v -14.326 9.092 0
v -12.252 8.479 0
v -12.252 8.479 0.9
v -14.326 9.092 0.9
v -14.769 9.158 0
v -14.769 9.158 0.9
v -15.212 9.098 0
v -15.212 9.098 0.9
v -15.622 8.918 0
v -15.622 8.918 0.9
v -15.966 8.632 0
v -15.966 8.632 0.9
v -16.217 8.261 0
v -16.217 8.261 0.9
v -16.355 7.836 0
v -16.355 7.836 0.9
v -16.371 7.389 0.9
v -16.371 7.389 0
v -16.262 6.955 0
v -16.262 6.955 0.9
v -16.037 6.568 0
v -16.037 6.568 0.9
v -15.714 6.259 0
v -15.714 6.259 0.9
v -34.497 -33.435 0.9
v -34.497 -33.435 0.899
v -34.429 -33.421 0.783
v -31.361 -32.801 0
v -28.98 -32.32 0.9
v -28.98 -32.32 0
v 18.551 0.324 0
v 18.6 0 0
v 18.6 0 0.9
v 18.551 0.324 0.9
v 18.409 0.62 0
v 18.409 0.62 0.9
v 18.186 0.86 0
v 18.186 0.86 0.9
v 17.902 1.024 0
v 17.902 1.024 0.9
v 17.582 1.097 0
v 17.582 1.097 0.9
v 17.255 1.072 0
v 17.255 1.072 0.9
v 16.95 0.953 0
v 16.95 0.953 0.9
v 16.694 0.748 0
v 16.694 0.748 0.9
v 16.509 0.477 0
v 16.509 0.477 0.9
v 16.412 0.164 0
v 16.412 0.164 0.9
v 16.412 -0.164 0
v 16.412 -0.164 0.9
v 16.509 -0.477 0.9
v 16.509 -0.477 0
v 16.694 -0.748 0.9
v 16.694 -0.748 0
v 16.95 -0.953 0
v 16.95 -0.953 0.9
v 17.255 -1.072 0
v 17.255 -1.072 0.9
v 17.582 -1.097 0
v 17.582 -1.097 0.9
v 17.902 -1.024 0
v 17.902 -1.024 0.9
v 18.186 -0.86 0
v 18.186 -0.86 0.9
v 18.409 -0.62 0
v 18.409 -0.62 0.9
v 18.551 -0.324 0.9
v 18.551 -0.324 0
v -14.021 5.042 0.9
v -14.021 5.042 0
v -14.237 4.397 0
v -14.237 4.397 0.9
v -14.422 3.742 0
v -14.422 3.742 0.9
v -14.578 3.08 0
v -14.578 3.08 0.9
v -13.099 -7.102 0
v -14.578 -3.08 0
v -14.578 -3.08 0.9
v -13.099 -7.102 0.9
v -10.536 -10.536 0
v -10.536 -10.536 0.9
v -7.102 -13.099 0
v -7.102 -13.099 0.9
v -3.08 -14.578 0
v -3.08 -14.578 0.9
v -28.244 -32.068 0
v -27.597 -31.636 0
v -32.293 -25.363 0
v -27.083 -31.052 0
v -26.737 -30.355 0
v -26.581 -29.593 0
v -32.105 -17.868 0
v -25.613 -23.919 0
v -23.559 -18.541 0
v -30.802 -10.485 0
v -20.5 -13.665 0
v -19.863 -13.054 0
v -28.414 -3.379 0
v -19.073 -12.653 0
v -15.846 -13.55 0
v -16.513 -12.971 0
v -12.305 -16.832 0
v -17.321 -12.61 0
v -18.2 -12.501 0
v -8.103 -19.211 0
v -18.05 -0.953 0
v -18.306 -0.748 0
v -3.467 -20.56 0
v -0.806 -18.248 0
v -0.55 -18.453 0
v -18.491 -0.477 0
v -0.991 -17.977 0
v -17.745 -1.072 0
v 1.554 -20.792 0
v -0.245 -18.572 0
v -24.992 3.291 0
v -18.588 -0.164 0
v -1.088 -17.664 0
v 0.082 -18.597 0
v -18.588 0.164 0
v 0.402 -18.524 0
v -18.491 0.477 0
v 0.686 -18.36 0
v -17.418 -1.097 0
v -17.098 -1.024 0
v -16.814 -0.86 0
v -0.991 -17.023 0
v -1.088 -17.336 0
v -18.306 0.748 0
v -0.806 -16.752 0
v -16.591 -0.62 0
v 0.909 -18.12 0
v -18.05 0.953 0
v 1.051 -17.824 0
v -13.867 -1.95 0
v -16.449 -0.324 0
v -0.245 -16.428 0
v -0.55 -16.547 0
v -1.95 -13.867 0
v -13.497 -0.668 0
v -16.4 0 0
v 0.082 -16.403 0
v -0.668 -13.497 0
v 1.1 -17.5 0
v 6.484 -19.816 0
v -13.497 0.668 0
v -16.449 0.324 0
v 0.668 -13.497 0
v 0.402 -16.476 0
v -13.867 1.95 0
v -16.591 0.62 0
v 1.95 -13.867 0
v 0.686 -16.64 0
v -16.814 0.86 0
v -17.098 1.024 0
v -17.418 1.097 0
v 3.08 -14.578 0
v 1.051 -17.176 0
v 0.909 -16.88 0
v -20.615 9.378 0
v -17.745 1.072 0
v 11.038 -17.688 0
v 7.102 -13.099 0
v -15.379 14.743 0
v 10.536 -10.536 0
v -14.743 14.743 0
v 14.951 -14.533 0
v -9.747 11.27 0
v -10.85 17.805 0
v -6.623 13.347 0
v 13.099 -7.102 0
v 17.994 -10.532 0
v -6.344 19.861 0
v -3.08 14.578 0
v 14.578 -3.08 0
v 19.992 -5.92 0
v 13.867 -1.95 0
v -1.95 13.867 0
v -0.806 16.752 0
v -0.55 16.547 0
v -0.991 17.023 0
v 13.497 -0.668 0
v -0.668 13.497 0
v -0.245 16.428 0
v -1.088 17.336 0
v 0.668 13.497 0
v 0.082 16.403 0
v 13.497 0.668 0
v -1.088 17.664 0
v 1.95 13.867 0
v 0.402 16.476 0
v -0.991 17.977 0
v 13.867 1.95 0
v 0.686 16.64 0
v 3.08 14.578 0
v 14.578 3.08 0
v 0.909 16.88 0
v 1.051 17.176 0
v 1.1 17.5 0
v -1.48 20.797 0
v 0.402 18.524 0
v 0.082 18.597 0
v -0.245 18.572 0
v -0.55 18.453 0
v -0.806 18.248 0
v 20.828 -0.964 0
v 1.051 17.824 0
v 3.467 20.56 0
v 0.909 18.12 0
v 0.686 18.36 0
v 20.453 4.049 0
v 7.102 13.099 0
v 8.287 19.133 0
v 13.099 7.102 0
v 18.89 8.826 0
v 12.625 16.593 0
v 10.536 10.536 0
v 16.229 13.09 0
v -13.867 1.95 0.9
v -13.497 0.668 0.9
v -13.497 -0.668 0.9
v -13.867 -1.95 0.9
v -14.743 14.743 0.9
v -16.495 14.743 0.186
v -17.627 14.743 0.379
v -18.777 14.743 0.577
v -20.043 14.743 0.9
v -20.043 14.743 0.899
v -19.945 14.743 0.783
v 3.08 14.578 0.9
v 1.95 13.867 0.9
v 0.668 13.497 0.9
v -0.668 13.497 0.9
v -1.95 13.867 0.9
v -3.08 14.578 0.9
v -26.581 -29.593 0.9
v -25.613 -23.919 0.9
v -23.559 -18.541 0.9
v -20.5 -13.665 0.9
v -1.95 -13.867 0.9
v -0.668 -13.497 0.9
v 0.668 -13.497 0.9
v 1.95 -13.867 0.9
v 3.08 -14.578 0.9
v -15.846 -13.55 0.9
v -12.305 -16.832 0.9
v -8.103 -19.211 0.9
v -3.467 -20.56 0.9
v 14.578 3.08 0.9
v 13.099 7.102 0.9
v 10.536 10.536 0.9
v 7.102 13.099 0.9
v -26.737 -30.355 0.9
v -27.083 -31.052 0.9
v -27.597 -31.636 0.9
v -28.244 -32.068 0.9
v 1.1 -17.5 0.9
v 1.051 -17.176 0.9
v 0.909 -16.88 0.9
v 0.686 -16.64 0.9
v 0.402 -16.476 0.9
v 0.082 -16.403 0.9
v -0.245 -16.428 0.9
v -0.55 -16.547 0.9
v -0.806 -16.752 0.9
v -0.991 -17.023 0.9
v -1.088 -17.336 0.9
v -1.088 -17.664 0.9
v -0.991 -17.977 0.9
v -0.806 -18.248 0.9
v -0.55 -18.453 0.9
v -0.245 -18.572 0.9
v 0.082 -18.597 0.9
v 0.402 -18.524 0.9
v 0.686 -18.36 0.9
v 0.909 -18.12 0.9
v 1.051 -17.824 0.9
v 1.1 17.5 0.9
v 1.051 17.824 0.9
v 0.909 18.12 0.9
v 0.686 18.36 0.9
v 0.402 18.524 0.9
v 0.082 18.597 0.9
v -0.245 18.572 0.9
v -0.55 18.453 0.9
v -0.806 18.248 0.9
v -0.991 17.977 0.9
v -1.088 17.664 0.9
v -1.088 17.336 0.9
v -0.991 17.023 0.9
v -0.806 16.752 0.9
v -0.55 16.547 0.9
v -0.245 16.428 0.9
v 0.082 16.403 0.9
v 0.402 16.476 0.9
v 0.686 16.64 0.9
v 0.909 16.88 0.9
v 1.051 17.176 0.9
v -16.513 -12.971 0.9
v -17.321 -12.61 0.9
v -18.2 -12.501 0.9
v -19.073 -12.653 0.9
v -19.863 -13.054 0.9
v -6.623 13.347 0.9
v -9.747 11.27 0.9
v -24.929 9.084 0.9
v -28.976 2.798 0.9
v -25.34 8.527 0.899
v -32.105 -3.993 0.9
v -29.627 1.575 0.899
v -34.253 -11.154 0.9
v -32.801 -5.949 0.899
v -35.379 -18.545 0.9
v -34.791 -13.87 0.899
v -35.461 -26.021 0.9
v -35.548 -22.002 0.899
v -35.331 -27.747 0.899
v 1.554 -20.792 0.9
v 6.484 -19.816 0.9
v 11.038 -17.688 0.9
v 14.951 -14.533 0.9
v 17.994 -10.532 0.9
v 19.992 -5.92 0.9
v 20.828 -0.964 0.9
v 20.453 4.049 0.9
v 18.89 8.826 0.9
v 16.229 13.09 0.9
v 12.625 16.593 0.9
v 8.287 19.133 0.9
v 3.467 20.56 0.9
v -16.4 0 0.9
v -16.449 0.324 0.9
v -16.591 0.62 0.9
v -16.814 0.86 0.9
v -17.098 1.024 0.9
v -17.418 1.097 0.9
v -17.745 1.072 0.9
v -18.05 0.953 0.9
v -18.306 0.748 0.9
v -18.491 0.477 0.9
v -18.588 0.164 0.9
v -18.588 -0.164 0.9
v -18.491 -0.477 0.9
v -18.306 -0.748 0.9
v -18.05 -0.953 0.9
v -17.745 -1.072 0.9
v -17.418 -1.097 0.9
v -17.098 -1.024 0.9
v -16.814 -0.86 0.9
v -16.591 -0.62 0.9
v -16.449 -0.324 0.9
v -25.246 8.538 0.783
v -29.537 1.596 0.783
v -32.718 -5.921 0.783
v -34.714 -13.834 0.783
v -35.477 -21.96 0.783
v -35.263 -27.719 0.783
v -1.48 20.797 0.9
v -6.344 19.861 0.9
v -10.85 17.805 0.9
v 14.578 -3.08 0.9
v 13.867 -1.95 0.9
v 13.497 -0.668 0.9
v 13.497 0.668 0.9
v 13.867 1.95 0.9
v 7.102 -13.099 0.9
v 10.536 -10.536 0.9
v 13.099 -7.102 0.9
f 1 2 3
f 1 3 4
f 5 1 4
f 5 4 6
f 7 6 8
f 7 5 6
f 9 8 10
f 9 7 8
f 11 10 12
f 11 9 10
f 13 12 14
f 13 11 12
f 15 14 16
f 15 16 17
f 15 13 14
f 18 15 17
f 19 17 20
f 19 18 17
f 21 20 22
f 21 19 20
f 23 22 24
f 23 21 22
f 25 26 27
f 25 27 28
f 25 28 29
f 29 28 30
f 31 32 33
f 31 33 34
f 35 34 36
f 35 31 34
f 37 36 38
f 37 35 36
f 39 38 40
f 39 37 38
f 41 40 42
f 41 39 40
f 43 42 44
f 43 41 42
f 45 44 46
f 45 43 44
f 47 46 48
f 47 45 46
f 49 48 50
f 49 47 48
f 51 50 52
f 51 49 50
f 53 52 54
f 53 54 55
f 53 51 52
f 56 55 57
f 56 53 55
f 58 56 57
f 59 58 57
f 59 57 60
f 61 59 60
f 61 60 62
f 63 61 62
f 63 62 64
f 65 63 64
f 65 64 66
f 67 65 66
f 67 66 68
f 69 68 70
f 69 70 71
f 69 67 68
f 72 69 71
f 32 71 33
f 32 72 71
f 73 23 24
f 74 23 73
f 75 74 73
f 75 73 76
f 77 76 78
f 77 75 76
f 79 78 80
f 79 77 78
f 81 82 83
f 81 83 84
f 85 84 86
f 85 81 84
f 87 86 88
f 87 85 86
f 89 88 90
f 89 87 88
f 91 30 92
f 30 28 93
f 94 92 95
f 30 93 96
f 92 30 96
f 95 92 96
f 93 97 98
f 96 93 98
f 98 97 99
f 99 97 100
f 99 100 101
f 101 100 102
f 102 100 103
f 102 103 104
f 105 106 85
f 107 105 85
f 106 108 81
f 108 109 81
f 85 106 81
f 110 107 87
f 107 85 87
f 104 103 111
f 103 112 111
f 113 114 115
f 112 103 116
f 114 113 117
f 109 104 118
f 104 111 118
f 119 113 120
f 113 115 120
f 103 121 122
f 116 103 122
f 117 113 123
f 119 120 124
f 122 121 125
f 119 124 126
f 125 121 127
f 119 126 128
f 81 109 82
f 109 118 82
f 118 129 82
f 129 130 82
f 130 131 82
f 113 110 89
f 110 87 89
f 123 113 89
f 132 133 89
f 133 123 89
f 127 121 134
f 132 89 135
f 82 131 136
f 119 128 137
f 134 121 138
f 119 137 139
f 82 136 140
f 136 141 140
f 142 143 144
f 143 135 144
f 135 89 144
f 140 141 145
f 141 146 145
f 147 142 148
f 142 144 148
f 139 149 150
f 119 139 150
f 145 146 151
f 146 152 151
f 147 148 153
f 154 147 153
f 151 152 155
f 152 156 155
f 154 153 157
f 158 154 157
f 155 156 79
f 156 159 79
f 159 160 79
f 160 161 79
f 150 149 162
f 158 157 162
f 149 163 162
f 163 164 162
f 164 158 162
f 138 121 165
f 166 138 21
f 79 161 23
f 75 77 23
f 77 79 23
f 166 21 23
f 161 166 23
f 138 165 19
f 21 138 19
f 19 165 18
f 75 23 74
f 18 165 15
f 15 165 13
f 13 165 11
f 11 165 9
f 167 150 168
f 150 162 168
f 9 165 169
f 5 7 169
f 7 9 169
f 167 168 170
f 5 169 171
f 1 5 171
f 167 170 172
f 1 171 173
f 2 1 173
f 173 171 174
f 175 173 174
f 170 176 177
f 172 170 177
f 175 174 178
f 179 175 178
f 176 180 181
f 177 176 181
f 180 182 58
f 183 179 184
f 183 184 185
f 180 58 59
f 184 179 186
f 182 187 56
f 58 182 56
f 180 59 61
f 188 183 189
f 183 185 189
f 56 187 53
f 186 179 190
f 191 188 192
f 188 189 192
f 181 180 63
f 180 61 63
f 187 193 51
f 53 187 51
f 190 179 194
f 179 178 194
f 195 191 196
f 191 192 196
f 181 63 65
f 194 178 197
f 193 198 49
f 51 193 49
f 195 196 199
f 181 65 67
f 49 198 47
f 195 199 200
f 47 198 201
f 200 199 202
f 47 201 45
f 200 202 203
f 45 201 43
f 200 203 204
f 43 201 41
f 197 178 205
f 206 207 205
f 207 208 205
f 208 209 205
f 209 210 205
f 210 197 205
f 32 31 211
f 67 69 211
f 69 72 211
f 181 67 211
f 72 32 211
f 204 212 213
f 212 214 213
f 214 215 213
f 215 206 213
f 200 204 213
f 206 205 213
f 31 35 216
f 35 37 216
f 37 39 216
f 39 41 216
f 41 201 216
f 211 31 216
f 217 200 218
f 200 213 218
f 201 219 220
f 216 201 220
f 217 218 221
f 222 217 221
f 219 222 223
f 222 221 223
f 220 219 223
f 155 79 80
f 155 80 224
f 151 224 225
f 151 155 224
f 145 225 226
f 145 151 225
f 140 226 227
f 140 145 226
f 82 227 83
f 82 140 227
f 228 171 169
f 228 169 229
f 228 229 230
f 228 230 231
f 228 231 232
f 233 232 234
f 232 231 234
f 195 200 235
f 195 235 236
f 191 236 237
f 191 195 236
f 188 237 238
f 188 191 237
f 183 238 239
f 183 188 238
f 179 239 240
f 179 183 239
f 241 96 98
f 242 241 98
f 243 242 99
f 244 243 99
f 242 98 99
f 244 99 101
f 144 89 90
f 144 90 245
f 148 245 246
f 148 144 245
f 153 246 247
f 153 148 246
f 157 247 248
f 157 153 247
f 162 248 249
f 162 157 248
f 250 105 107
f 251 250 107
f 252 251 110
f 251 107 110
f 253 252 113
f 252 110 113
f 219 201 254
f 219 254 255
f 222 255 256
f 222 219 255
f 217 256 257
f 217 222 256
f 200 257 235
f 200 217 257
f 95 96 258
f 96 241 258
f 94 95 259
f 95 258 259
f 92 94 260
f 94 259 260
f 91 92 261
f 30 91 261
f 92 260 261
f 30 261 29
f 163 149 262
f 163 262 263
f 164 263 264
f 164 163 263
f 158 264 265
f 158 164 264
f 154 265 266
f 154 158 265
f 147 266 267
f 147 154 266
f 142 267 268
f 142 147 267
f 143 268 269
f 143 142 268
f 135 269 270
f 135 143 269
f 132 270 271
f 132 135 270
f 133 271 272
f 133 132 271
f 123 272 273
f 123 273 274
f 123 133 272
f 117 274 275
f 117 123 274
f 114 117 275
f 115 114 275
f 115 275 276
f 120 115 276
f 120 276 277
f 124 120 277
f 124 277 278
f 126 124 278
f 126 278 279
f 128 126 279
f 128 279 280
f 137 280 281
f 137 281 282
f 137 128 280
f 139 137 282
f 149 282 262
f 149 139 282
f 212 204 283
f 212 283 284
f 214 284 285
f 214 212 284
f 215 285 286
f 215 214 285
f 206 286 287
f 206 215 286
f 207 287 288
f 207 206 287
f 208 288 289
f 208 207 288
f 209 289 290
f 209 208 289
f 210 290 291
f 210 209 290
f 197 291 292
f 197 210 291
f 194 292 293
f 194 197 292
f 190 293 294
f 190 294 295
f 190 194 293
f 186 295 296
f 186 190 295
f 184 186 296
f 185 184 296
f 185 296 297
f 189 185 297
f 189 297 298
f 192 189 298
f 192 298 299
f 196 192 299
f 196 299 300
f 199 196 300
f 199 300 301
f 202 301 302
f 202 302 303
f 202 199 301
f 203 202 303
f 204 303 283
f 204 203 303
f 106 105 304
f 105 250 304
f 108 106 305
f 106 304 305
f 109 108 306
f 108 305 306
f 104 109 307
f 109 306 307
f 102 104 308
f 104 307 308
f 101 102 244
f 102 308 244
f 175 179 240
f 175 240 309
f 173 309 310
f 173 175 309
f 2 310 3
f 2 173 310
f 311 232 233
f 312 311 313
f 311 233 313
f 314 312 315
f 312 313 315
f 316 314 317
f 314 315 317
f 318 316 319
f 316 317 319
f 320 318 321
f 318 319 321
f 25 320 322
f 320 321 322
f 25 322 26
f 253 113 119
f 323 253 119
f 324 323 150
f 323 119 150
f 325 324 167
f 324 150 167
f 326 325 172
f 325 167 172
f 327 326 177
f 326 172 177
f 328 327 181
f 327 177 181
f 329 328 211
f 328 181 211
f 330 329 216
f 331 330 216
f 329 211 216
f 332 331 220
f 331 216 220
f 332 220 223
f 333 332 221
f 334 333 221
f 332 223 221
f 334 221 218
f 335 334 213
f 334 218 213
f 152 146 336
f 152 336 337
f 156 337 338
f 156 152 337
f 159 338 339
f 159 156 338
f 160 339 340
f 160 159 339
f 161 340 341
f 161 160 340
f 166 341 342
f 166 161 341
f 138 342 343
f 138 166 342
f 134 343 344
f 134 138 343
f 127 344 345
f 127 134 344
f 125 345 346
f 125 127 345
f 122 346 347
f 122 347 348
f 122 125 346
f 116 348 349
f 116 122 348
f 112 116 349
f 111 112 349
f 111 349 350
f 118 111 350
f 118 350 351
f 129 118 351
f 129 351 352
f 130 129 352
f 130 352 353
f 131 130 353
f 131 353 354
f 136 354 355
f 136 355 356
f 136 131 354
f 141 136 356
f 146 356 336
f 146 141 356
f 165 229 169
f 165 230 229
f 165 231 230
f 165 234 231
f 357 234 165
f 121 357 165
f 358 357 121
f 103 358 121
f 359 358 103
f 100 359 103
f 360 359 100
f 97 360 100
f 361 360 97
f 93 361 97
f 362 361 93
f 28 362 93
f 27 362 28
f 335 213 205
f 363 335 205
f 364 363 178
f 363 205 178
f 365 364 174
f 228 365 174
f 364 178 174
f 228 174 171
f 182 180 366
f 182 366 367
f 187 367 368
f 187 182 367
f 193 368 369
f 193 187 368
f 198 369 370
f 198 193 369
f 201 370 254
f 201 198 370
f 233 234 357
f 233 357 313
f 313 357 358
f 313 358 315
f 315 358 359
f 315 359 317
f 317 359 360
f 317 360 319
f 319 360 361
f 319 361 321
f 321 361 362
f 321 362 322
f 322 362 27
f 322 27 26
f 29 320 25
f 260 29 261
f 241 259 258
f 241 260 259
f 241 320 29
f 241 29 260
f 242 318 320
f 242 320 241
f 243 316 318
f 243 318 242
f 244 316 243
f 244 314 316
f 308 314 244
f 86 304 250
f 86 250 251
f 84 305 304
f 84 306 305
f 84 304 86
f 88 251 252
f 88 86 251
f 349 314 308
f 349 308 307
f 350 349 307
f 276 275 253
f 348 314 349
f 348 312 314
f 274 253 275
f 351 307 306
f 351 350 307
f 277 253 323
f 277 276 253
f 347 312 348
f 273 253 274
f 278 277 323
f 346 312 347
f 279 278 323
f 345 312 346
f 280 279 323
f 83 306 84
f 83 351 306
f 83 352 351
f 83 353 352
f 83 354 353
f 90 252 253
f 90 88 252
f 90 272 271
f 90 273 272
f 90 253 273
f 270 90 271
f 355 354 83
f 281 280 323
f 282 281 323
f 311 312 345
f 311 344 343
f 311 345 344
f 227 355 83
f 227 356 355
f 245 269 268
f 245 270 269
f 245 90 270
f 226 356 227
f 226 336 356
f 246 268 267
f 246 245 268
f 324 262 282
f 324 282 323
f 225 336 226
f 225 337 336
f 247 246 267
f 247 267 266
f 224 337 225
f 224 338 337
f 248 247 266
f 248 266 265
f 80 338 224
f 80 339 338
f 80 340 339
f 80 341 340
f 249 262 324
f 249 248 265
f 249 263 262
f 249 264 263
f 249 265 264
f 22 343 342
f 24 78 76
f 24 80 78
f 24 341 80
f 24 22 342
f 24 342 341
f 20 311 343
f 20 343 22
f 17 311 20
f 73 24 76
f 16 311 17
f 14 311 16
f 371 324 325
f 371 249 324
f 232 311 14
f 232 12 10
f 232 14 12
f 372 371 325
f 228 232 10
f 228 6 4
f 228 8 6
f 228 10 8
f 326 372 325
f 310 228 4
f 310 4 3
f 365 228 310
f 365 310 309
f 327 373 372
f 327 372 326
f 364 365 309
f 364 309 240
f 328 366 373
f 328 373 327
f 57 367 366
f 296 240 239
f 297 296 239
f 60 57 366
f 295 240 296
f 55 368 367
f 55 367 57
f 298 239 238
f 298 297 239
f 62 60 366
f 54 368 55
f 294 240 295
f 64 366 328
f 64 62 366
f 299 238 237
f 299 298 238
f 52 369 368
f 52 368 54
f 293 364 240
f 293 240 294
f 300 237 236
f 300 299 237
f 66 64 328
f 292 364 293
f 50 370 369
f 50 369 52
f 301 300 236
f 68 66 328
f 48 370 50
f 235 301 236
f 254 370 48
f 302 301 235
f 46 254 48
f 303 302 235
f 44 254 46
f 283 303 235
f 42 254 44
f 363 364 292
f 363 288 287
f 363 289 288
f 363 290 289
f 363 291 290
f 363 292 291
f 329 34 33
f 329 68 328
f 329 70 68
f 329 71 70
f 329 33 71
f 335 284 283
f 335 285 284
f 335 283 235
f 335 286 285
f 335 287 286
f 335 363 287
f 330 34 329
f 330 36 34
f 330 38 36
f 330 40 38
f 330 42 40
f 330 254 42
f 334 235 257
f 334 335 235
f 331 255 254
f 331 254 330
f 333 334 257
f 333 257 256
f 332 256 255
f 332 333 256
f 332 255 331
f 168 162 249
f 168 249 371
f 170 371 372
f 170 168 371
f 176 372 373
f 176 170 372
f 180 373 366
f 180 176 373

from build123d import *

# Parameters (mm, degrees)
TOP_BLADE_PROFILE_R     = 1.1
BASIC_BLADE_SHAPE_DEPTH = 0.9
EDGE_GRIND_SIZE         = 0.072
EDGE_GRIND_SIZE2        = 0.098954535
BLADE_ROOT_FILLET_R     = 3
BLADE_END_FILLET_R      = 3


with BuildPart() as part:
    # top blade profile → basic blade shape (new body)
    with BuildSketch(Plane.XY):
        with BuildLine():
            Line((-14.743176388, 14.743176388), (-20.043176388, 14.743176388))
            ThreePointArc((-20.043176388, 14.743176388), (-33.304536559, -7.535711071), (-34.497327018, -33.435320159))
            Line((-34.497327018, -33.435320159), (-26.655881065, -31.850477781))
            ThreePointArc((-26.655881065, -31.850477781), (-24.405908014, -20.396982829), (-17.885844028, -10.715366695))
            ThreePointArc((-17.885844028, -10.715366695), (-11.75653181, -17.219362932), (-3.467222551, -20.559690362))
            ThreePointArc((-3.467222551, -20.559690362), (20.559690362, -3.467222551), (3.467222551, 20.559690362))
            ThreePointArc((3.467222551, 20.559690362), (-6.343874402, 19.861464135), (-14.743176388, 14.743176388))
        make_face()
        with Locations((-17.5, 0)):
            Circle(TOP_BLADE_PROFILE_R, mode=Mode.SUBTRACT)
        with Locations((0, -17.5)):
            Circle(TOP_BLADE_PROFILE_R, mode=Mode.SUBTRACT)
        with Locations((17.5, 0)):
            Circle(TOP_BLADE_PROFILE_R, mode=Mode.SUBTRACT)
        with Locations((0, 17.5)):
            Circle(TOP_BLADE_PROFILE_R, mode=Mode.SUBTRACT)
        with BuildLine():
            Line((-15.713707666, 6.258524906), (-14.021091263, 5.041725875))
            ThreePointArc((-14.021091263, 5.041725875), (-14.333173834, 4.07064219), (-14.578087267, 3.080482372))
            ThreePointArc((-14.578087267, 3.080482372), (-13.45, 0), (-14.578087267, -3.080482372))
            ThreePointArc((-14.578087267, -3.080482372), (-10.53589104, -10.53589104), (-3.080482372, -14.578087267))
            ThreePointArc((-3.080482372, -14.578087267), (0, -13.45), (3.080482372, -14.578087267))
            ThreePointArc((3.080482372, -14.578087267), (10.53589104, -10.53589104), (14.578087267, -3.080482372))
            ThreePointArc((14.578087267, -3.080482372), (13.45, 0), (14.578087267, 3.080482372))
            ThreePointArc((14.578087267, 3.080482372), (10.53589104, 10.53589104), (3.080482372, 14.578087267))
            ThreePointArc((3.080482372, 14.578087267), (0, 13.45), (-3.080482372, 14.578087267))
            ThreePointArc((-3.080482372, 14.578087267), (-8.250663905, 12.407116713), (-12.252281094, 8.478891908))
            Line((-12.252281094, 8.478891908), (-14.32615504, 9.092015713))
            ThreePointArc((-14.32615504, 9.092015713), (-16.216729433, 8.261339025), (-15.713707666, 6.258524906))
        make_face(mode=Mode.SUBTRACT)
    extrude(amount=BASIC_BLADE_SHAPE_DEPTH)

    # blade grind: sweep along a path in grind path
    with BuildLine(Plane.XY.offset(0.9)) as blade_grind_path:
        ThreePointArc((-14.282047318, 19.76313332), (-32.075420619, -3.915533869), (-34.497327018, -33.435320159))
    # Sketch1 → blade grind (sweep, cut)
    with BuildSketch(Plane(origin=(5.138564907, -25.424470933, 0), x_dir=(0.9801807441283484, 0.19810529735470822, 0), z_dir=(0.19810529735470822, -0.9801807441283484, 0))):
        Polygon((-40.43732971, 0), (-40.43732971, 0.8), (-37.23732971, 0), align=None)
    sweep(path=blade_grind_path.line, mode=Mode.SUBTRACT)

    # edge grind
    edge_grind_edges = [part.edges().sort_by_distance(p)[0] for p in [
        (-33.304536559, -7.535711071, 0.8),
    ]]
    edge_grind_side = [part.faces().sort_by_distance(p)[0] for p in [
        (-31.257621093, -6.37778083, 0.4),
    ]]
    chamfer(edge_grind_edges, length=EDGE_GRIND_SIZE, length2=EDGE_GRIND_SIZE2, reference=edge_grind_side[0])

    # blade root fillet
    blade_root_fillet_edges = [part.edges().sort_by_distance(p)[0] for p in [
        (-17.885844028, -10.715366695, 0.45),
    ]]
    fillet(blade_root_fillet_edges, radius=BLADE_ROOT_FILLET_R)

    # blade end fillet
    blade_end_fillet_edges = [part.edges().sort_by_distance(p)[0] for p in [
        (-26.655881065, -31.850477781, 0.45),
    ]]
    fillet(blade_end_fillet_edges, radius=BLADE_END_FILLET_R)


solid = part.part
